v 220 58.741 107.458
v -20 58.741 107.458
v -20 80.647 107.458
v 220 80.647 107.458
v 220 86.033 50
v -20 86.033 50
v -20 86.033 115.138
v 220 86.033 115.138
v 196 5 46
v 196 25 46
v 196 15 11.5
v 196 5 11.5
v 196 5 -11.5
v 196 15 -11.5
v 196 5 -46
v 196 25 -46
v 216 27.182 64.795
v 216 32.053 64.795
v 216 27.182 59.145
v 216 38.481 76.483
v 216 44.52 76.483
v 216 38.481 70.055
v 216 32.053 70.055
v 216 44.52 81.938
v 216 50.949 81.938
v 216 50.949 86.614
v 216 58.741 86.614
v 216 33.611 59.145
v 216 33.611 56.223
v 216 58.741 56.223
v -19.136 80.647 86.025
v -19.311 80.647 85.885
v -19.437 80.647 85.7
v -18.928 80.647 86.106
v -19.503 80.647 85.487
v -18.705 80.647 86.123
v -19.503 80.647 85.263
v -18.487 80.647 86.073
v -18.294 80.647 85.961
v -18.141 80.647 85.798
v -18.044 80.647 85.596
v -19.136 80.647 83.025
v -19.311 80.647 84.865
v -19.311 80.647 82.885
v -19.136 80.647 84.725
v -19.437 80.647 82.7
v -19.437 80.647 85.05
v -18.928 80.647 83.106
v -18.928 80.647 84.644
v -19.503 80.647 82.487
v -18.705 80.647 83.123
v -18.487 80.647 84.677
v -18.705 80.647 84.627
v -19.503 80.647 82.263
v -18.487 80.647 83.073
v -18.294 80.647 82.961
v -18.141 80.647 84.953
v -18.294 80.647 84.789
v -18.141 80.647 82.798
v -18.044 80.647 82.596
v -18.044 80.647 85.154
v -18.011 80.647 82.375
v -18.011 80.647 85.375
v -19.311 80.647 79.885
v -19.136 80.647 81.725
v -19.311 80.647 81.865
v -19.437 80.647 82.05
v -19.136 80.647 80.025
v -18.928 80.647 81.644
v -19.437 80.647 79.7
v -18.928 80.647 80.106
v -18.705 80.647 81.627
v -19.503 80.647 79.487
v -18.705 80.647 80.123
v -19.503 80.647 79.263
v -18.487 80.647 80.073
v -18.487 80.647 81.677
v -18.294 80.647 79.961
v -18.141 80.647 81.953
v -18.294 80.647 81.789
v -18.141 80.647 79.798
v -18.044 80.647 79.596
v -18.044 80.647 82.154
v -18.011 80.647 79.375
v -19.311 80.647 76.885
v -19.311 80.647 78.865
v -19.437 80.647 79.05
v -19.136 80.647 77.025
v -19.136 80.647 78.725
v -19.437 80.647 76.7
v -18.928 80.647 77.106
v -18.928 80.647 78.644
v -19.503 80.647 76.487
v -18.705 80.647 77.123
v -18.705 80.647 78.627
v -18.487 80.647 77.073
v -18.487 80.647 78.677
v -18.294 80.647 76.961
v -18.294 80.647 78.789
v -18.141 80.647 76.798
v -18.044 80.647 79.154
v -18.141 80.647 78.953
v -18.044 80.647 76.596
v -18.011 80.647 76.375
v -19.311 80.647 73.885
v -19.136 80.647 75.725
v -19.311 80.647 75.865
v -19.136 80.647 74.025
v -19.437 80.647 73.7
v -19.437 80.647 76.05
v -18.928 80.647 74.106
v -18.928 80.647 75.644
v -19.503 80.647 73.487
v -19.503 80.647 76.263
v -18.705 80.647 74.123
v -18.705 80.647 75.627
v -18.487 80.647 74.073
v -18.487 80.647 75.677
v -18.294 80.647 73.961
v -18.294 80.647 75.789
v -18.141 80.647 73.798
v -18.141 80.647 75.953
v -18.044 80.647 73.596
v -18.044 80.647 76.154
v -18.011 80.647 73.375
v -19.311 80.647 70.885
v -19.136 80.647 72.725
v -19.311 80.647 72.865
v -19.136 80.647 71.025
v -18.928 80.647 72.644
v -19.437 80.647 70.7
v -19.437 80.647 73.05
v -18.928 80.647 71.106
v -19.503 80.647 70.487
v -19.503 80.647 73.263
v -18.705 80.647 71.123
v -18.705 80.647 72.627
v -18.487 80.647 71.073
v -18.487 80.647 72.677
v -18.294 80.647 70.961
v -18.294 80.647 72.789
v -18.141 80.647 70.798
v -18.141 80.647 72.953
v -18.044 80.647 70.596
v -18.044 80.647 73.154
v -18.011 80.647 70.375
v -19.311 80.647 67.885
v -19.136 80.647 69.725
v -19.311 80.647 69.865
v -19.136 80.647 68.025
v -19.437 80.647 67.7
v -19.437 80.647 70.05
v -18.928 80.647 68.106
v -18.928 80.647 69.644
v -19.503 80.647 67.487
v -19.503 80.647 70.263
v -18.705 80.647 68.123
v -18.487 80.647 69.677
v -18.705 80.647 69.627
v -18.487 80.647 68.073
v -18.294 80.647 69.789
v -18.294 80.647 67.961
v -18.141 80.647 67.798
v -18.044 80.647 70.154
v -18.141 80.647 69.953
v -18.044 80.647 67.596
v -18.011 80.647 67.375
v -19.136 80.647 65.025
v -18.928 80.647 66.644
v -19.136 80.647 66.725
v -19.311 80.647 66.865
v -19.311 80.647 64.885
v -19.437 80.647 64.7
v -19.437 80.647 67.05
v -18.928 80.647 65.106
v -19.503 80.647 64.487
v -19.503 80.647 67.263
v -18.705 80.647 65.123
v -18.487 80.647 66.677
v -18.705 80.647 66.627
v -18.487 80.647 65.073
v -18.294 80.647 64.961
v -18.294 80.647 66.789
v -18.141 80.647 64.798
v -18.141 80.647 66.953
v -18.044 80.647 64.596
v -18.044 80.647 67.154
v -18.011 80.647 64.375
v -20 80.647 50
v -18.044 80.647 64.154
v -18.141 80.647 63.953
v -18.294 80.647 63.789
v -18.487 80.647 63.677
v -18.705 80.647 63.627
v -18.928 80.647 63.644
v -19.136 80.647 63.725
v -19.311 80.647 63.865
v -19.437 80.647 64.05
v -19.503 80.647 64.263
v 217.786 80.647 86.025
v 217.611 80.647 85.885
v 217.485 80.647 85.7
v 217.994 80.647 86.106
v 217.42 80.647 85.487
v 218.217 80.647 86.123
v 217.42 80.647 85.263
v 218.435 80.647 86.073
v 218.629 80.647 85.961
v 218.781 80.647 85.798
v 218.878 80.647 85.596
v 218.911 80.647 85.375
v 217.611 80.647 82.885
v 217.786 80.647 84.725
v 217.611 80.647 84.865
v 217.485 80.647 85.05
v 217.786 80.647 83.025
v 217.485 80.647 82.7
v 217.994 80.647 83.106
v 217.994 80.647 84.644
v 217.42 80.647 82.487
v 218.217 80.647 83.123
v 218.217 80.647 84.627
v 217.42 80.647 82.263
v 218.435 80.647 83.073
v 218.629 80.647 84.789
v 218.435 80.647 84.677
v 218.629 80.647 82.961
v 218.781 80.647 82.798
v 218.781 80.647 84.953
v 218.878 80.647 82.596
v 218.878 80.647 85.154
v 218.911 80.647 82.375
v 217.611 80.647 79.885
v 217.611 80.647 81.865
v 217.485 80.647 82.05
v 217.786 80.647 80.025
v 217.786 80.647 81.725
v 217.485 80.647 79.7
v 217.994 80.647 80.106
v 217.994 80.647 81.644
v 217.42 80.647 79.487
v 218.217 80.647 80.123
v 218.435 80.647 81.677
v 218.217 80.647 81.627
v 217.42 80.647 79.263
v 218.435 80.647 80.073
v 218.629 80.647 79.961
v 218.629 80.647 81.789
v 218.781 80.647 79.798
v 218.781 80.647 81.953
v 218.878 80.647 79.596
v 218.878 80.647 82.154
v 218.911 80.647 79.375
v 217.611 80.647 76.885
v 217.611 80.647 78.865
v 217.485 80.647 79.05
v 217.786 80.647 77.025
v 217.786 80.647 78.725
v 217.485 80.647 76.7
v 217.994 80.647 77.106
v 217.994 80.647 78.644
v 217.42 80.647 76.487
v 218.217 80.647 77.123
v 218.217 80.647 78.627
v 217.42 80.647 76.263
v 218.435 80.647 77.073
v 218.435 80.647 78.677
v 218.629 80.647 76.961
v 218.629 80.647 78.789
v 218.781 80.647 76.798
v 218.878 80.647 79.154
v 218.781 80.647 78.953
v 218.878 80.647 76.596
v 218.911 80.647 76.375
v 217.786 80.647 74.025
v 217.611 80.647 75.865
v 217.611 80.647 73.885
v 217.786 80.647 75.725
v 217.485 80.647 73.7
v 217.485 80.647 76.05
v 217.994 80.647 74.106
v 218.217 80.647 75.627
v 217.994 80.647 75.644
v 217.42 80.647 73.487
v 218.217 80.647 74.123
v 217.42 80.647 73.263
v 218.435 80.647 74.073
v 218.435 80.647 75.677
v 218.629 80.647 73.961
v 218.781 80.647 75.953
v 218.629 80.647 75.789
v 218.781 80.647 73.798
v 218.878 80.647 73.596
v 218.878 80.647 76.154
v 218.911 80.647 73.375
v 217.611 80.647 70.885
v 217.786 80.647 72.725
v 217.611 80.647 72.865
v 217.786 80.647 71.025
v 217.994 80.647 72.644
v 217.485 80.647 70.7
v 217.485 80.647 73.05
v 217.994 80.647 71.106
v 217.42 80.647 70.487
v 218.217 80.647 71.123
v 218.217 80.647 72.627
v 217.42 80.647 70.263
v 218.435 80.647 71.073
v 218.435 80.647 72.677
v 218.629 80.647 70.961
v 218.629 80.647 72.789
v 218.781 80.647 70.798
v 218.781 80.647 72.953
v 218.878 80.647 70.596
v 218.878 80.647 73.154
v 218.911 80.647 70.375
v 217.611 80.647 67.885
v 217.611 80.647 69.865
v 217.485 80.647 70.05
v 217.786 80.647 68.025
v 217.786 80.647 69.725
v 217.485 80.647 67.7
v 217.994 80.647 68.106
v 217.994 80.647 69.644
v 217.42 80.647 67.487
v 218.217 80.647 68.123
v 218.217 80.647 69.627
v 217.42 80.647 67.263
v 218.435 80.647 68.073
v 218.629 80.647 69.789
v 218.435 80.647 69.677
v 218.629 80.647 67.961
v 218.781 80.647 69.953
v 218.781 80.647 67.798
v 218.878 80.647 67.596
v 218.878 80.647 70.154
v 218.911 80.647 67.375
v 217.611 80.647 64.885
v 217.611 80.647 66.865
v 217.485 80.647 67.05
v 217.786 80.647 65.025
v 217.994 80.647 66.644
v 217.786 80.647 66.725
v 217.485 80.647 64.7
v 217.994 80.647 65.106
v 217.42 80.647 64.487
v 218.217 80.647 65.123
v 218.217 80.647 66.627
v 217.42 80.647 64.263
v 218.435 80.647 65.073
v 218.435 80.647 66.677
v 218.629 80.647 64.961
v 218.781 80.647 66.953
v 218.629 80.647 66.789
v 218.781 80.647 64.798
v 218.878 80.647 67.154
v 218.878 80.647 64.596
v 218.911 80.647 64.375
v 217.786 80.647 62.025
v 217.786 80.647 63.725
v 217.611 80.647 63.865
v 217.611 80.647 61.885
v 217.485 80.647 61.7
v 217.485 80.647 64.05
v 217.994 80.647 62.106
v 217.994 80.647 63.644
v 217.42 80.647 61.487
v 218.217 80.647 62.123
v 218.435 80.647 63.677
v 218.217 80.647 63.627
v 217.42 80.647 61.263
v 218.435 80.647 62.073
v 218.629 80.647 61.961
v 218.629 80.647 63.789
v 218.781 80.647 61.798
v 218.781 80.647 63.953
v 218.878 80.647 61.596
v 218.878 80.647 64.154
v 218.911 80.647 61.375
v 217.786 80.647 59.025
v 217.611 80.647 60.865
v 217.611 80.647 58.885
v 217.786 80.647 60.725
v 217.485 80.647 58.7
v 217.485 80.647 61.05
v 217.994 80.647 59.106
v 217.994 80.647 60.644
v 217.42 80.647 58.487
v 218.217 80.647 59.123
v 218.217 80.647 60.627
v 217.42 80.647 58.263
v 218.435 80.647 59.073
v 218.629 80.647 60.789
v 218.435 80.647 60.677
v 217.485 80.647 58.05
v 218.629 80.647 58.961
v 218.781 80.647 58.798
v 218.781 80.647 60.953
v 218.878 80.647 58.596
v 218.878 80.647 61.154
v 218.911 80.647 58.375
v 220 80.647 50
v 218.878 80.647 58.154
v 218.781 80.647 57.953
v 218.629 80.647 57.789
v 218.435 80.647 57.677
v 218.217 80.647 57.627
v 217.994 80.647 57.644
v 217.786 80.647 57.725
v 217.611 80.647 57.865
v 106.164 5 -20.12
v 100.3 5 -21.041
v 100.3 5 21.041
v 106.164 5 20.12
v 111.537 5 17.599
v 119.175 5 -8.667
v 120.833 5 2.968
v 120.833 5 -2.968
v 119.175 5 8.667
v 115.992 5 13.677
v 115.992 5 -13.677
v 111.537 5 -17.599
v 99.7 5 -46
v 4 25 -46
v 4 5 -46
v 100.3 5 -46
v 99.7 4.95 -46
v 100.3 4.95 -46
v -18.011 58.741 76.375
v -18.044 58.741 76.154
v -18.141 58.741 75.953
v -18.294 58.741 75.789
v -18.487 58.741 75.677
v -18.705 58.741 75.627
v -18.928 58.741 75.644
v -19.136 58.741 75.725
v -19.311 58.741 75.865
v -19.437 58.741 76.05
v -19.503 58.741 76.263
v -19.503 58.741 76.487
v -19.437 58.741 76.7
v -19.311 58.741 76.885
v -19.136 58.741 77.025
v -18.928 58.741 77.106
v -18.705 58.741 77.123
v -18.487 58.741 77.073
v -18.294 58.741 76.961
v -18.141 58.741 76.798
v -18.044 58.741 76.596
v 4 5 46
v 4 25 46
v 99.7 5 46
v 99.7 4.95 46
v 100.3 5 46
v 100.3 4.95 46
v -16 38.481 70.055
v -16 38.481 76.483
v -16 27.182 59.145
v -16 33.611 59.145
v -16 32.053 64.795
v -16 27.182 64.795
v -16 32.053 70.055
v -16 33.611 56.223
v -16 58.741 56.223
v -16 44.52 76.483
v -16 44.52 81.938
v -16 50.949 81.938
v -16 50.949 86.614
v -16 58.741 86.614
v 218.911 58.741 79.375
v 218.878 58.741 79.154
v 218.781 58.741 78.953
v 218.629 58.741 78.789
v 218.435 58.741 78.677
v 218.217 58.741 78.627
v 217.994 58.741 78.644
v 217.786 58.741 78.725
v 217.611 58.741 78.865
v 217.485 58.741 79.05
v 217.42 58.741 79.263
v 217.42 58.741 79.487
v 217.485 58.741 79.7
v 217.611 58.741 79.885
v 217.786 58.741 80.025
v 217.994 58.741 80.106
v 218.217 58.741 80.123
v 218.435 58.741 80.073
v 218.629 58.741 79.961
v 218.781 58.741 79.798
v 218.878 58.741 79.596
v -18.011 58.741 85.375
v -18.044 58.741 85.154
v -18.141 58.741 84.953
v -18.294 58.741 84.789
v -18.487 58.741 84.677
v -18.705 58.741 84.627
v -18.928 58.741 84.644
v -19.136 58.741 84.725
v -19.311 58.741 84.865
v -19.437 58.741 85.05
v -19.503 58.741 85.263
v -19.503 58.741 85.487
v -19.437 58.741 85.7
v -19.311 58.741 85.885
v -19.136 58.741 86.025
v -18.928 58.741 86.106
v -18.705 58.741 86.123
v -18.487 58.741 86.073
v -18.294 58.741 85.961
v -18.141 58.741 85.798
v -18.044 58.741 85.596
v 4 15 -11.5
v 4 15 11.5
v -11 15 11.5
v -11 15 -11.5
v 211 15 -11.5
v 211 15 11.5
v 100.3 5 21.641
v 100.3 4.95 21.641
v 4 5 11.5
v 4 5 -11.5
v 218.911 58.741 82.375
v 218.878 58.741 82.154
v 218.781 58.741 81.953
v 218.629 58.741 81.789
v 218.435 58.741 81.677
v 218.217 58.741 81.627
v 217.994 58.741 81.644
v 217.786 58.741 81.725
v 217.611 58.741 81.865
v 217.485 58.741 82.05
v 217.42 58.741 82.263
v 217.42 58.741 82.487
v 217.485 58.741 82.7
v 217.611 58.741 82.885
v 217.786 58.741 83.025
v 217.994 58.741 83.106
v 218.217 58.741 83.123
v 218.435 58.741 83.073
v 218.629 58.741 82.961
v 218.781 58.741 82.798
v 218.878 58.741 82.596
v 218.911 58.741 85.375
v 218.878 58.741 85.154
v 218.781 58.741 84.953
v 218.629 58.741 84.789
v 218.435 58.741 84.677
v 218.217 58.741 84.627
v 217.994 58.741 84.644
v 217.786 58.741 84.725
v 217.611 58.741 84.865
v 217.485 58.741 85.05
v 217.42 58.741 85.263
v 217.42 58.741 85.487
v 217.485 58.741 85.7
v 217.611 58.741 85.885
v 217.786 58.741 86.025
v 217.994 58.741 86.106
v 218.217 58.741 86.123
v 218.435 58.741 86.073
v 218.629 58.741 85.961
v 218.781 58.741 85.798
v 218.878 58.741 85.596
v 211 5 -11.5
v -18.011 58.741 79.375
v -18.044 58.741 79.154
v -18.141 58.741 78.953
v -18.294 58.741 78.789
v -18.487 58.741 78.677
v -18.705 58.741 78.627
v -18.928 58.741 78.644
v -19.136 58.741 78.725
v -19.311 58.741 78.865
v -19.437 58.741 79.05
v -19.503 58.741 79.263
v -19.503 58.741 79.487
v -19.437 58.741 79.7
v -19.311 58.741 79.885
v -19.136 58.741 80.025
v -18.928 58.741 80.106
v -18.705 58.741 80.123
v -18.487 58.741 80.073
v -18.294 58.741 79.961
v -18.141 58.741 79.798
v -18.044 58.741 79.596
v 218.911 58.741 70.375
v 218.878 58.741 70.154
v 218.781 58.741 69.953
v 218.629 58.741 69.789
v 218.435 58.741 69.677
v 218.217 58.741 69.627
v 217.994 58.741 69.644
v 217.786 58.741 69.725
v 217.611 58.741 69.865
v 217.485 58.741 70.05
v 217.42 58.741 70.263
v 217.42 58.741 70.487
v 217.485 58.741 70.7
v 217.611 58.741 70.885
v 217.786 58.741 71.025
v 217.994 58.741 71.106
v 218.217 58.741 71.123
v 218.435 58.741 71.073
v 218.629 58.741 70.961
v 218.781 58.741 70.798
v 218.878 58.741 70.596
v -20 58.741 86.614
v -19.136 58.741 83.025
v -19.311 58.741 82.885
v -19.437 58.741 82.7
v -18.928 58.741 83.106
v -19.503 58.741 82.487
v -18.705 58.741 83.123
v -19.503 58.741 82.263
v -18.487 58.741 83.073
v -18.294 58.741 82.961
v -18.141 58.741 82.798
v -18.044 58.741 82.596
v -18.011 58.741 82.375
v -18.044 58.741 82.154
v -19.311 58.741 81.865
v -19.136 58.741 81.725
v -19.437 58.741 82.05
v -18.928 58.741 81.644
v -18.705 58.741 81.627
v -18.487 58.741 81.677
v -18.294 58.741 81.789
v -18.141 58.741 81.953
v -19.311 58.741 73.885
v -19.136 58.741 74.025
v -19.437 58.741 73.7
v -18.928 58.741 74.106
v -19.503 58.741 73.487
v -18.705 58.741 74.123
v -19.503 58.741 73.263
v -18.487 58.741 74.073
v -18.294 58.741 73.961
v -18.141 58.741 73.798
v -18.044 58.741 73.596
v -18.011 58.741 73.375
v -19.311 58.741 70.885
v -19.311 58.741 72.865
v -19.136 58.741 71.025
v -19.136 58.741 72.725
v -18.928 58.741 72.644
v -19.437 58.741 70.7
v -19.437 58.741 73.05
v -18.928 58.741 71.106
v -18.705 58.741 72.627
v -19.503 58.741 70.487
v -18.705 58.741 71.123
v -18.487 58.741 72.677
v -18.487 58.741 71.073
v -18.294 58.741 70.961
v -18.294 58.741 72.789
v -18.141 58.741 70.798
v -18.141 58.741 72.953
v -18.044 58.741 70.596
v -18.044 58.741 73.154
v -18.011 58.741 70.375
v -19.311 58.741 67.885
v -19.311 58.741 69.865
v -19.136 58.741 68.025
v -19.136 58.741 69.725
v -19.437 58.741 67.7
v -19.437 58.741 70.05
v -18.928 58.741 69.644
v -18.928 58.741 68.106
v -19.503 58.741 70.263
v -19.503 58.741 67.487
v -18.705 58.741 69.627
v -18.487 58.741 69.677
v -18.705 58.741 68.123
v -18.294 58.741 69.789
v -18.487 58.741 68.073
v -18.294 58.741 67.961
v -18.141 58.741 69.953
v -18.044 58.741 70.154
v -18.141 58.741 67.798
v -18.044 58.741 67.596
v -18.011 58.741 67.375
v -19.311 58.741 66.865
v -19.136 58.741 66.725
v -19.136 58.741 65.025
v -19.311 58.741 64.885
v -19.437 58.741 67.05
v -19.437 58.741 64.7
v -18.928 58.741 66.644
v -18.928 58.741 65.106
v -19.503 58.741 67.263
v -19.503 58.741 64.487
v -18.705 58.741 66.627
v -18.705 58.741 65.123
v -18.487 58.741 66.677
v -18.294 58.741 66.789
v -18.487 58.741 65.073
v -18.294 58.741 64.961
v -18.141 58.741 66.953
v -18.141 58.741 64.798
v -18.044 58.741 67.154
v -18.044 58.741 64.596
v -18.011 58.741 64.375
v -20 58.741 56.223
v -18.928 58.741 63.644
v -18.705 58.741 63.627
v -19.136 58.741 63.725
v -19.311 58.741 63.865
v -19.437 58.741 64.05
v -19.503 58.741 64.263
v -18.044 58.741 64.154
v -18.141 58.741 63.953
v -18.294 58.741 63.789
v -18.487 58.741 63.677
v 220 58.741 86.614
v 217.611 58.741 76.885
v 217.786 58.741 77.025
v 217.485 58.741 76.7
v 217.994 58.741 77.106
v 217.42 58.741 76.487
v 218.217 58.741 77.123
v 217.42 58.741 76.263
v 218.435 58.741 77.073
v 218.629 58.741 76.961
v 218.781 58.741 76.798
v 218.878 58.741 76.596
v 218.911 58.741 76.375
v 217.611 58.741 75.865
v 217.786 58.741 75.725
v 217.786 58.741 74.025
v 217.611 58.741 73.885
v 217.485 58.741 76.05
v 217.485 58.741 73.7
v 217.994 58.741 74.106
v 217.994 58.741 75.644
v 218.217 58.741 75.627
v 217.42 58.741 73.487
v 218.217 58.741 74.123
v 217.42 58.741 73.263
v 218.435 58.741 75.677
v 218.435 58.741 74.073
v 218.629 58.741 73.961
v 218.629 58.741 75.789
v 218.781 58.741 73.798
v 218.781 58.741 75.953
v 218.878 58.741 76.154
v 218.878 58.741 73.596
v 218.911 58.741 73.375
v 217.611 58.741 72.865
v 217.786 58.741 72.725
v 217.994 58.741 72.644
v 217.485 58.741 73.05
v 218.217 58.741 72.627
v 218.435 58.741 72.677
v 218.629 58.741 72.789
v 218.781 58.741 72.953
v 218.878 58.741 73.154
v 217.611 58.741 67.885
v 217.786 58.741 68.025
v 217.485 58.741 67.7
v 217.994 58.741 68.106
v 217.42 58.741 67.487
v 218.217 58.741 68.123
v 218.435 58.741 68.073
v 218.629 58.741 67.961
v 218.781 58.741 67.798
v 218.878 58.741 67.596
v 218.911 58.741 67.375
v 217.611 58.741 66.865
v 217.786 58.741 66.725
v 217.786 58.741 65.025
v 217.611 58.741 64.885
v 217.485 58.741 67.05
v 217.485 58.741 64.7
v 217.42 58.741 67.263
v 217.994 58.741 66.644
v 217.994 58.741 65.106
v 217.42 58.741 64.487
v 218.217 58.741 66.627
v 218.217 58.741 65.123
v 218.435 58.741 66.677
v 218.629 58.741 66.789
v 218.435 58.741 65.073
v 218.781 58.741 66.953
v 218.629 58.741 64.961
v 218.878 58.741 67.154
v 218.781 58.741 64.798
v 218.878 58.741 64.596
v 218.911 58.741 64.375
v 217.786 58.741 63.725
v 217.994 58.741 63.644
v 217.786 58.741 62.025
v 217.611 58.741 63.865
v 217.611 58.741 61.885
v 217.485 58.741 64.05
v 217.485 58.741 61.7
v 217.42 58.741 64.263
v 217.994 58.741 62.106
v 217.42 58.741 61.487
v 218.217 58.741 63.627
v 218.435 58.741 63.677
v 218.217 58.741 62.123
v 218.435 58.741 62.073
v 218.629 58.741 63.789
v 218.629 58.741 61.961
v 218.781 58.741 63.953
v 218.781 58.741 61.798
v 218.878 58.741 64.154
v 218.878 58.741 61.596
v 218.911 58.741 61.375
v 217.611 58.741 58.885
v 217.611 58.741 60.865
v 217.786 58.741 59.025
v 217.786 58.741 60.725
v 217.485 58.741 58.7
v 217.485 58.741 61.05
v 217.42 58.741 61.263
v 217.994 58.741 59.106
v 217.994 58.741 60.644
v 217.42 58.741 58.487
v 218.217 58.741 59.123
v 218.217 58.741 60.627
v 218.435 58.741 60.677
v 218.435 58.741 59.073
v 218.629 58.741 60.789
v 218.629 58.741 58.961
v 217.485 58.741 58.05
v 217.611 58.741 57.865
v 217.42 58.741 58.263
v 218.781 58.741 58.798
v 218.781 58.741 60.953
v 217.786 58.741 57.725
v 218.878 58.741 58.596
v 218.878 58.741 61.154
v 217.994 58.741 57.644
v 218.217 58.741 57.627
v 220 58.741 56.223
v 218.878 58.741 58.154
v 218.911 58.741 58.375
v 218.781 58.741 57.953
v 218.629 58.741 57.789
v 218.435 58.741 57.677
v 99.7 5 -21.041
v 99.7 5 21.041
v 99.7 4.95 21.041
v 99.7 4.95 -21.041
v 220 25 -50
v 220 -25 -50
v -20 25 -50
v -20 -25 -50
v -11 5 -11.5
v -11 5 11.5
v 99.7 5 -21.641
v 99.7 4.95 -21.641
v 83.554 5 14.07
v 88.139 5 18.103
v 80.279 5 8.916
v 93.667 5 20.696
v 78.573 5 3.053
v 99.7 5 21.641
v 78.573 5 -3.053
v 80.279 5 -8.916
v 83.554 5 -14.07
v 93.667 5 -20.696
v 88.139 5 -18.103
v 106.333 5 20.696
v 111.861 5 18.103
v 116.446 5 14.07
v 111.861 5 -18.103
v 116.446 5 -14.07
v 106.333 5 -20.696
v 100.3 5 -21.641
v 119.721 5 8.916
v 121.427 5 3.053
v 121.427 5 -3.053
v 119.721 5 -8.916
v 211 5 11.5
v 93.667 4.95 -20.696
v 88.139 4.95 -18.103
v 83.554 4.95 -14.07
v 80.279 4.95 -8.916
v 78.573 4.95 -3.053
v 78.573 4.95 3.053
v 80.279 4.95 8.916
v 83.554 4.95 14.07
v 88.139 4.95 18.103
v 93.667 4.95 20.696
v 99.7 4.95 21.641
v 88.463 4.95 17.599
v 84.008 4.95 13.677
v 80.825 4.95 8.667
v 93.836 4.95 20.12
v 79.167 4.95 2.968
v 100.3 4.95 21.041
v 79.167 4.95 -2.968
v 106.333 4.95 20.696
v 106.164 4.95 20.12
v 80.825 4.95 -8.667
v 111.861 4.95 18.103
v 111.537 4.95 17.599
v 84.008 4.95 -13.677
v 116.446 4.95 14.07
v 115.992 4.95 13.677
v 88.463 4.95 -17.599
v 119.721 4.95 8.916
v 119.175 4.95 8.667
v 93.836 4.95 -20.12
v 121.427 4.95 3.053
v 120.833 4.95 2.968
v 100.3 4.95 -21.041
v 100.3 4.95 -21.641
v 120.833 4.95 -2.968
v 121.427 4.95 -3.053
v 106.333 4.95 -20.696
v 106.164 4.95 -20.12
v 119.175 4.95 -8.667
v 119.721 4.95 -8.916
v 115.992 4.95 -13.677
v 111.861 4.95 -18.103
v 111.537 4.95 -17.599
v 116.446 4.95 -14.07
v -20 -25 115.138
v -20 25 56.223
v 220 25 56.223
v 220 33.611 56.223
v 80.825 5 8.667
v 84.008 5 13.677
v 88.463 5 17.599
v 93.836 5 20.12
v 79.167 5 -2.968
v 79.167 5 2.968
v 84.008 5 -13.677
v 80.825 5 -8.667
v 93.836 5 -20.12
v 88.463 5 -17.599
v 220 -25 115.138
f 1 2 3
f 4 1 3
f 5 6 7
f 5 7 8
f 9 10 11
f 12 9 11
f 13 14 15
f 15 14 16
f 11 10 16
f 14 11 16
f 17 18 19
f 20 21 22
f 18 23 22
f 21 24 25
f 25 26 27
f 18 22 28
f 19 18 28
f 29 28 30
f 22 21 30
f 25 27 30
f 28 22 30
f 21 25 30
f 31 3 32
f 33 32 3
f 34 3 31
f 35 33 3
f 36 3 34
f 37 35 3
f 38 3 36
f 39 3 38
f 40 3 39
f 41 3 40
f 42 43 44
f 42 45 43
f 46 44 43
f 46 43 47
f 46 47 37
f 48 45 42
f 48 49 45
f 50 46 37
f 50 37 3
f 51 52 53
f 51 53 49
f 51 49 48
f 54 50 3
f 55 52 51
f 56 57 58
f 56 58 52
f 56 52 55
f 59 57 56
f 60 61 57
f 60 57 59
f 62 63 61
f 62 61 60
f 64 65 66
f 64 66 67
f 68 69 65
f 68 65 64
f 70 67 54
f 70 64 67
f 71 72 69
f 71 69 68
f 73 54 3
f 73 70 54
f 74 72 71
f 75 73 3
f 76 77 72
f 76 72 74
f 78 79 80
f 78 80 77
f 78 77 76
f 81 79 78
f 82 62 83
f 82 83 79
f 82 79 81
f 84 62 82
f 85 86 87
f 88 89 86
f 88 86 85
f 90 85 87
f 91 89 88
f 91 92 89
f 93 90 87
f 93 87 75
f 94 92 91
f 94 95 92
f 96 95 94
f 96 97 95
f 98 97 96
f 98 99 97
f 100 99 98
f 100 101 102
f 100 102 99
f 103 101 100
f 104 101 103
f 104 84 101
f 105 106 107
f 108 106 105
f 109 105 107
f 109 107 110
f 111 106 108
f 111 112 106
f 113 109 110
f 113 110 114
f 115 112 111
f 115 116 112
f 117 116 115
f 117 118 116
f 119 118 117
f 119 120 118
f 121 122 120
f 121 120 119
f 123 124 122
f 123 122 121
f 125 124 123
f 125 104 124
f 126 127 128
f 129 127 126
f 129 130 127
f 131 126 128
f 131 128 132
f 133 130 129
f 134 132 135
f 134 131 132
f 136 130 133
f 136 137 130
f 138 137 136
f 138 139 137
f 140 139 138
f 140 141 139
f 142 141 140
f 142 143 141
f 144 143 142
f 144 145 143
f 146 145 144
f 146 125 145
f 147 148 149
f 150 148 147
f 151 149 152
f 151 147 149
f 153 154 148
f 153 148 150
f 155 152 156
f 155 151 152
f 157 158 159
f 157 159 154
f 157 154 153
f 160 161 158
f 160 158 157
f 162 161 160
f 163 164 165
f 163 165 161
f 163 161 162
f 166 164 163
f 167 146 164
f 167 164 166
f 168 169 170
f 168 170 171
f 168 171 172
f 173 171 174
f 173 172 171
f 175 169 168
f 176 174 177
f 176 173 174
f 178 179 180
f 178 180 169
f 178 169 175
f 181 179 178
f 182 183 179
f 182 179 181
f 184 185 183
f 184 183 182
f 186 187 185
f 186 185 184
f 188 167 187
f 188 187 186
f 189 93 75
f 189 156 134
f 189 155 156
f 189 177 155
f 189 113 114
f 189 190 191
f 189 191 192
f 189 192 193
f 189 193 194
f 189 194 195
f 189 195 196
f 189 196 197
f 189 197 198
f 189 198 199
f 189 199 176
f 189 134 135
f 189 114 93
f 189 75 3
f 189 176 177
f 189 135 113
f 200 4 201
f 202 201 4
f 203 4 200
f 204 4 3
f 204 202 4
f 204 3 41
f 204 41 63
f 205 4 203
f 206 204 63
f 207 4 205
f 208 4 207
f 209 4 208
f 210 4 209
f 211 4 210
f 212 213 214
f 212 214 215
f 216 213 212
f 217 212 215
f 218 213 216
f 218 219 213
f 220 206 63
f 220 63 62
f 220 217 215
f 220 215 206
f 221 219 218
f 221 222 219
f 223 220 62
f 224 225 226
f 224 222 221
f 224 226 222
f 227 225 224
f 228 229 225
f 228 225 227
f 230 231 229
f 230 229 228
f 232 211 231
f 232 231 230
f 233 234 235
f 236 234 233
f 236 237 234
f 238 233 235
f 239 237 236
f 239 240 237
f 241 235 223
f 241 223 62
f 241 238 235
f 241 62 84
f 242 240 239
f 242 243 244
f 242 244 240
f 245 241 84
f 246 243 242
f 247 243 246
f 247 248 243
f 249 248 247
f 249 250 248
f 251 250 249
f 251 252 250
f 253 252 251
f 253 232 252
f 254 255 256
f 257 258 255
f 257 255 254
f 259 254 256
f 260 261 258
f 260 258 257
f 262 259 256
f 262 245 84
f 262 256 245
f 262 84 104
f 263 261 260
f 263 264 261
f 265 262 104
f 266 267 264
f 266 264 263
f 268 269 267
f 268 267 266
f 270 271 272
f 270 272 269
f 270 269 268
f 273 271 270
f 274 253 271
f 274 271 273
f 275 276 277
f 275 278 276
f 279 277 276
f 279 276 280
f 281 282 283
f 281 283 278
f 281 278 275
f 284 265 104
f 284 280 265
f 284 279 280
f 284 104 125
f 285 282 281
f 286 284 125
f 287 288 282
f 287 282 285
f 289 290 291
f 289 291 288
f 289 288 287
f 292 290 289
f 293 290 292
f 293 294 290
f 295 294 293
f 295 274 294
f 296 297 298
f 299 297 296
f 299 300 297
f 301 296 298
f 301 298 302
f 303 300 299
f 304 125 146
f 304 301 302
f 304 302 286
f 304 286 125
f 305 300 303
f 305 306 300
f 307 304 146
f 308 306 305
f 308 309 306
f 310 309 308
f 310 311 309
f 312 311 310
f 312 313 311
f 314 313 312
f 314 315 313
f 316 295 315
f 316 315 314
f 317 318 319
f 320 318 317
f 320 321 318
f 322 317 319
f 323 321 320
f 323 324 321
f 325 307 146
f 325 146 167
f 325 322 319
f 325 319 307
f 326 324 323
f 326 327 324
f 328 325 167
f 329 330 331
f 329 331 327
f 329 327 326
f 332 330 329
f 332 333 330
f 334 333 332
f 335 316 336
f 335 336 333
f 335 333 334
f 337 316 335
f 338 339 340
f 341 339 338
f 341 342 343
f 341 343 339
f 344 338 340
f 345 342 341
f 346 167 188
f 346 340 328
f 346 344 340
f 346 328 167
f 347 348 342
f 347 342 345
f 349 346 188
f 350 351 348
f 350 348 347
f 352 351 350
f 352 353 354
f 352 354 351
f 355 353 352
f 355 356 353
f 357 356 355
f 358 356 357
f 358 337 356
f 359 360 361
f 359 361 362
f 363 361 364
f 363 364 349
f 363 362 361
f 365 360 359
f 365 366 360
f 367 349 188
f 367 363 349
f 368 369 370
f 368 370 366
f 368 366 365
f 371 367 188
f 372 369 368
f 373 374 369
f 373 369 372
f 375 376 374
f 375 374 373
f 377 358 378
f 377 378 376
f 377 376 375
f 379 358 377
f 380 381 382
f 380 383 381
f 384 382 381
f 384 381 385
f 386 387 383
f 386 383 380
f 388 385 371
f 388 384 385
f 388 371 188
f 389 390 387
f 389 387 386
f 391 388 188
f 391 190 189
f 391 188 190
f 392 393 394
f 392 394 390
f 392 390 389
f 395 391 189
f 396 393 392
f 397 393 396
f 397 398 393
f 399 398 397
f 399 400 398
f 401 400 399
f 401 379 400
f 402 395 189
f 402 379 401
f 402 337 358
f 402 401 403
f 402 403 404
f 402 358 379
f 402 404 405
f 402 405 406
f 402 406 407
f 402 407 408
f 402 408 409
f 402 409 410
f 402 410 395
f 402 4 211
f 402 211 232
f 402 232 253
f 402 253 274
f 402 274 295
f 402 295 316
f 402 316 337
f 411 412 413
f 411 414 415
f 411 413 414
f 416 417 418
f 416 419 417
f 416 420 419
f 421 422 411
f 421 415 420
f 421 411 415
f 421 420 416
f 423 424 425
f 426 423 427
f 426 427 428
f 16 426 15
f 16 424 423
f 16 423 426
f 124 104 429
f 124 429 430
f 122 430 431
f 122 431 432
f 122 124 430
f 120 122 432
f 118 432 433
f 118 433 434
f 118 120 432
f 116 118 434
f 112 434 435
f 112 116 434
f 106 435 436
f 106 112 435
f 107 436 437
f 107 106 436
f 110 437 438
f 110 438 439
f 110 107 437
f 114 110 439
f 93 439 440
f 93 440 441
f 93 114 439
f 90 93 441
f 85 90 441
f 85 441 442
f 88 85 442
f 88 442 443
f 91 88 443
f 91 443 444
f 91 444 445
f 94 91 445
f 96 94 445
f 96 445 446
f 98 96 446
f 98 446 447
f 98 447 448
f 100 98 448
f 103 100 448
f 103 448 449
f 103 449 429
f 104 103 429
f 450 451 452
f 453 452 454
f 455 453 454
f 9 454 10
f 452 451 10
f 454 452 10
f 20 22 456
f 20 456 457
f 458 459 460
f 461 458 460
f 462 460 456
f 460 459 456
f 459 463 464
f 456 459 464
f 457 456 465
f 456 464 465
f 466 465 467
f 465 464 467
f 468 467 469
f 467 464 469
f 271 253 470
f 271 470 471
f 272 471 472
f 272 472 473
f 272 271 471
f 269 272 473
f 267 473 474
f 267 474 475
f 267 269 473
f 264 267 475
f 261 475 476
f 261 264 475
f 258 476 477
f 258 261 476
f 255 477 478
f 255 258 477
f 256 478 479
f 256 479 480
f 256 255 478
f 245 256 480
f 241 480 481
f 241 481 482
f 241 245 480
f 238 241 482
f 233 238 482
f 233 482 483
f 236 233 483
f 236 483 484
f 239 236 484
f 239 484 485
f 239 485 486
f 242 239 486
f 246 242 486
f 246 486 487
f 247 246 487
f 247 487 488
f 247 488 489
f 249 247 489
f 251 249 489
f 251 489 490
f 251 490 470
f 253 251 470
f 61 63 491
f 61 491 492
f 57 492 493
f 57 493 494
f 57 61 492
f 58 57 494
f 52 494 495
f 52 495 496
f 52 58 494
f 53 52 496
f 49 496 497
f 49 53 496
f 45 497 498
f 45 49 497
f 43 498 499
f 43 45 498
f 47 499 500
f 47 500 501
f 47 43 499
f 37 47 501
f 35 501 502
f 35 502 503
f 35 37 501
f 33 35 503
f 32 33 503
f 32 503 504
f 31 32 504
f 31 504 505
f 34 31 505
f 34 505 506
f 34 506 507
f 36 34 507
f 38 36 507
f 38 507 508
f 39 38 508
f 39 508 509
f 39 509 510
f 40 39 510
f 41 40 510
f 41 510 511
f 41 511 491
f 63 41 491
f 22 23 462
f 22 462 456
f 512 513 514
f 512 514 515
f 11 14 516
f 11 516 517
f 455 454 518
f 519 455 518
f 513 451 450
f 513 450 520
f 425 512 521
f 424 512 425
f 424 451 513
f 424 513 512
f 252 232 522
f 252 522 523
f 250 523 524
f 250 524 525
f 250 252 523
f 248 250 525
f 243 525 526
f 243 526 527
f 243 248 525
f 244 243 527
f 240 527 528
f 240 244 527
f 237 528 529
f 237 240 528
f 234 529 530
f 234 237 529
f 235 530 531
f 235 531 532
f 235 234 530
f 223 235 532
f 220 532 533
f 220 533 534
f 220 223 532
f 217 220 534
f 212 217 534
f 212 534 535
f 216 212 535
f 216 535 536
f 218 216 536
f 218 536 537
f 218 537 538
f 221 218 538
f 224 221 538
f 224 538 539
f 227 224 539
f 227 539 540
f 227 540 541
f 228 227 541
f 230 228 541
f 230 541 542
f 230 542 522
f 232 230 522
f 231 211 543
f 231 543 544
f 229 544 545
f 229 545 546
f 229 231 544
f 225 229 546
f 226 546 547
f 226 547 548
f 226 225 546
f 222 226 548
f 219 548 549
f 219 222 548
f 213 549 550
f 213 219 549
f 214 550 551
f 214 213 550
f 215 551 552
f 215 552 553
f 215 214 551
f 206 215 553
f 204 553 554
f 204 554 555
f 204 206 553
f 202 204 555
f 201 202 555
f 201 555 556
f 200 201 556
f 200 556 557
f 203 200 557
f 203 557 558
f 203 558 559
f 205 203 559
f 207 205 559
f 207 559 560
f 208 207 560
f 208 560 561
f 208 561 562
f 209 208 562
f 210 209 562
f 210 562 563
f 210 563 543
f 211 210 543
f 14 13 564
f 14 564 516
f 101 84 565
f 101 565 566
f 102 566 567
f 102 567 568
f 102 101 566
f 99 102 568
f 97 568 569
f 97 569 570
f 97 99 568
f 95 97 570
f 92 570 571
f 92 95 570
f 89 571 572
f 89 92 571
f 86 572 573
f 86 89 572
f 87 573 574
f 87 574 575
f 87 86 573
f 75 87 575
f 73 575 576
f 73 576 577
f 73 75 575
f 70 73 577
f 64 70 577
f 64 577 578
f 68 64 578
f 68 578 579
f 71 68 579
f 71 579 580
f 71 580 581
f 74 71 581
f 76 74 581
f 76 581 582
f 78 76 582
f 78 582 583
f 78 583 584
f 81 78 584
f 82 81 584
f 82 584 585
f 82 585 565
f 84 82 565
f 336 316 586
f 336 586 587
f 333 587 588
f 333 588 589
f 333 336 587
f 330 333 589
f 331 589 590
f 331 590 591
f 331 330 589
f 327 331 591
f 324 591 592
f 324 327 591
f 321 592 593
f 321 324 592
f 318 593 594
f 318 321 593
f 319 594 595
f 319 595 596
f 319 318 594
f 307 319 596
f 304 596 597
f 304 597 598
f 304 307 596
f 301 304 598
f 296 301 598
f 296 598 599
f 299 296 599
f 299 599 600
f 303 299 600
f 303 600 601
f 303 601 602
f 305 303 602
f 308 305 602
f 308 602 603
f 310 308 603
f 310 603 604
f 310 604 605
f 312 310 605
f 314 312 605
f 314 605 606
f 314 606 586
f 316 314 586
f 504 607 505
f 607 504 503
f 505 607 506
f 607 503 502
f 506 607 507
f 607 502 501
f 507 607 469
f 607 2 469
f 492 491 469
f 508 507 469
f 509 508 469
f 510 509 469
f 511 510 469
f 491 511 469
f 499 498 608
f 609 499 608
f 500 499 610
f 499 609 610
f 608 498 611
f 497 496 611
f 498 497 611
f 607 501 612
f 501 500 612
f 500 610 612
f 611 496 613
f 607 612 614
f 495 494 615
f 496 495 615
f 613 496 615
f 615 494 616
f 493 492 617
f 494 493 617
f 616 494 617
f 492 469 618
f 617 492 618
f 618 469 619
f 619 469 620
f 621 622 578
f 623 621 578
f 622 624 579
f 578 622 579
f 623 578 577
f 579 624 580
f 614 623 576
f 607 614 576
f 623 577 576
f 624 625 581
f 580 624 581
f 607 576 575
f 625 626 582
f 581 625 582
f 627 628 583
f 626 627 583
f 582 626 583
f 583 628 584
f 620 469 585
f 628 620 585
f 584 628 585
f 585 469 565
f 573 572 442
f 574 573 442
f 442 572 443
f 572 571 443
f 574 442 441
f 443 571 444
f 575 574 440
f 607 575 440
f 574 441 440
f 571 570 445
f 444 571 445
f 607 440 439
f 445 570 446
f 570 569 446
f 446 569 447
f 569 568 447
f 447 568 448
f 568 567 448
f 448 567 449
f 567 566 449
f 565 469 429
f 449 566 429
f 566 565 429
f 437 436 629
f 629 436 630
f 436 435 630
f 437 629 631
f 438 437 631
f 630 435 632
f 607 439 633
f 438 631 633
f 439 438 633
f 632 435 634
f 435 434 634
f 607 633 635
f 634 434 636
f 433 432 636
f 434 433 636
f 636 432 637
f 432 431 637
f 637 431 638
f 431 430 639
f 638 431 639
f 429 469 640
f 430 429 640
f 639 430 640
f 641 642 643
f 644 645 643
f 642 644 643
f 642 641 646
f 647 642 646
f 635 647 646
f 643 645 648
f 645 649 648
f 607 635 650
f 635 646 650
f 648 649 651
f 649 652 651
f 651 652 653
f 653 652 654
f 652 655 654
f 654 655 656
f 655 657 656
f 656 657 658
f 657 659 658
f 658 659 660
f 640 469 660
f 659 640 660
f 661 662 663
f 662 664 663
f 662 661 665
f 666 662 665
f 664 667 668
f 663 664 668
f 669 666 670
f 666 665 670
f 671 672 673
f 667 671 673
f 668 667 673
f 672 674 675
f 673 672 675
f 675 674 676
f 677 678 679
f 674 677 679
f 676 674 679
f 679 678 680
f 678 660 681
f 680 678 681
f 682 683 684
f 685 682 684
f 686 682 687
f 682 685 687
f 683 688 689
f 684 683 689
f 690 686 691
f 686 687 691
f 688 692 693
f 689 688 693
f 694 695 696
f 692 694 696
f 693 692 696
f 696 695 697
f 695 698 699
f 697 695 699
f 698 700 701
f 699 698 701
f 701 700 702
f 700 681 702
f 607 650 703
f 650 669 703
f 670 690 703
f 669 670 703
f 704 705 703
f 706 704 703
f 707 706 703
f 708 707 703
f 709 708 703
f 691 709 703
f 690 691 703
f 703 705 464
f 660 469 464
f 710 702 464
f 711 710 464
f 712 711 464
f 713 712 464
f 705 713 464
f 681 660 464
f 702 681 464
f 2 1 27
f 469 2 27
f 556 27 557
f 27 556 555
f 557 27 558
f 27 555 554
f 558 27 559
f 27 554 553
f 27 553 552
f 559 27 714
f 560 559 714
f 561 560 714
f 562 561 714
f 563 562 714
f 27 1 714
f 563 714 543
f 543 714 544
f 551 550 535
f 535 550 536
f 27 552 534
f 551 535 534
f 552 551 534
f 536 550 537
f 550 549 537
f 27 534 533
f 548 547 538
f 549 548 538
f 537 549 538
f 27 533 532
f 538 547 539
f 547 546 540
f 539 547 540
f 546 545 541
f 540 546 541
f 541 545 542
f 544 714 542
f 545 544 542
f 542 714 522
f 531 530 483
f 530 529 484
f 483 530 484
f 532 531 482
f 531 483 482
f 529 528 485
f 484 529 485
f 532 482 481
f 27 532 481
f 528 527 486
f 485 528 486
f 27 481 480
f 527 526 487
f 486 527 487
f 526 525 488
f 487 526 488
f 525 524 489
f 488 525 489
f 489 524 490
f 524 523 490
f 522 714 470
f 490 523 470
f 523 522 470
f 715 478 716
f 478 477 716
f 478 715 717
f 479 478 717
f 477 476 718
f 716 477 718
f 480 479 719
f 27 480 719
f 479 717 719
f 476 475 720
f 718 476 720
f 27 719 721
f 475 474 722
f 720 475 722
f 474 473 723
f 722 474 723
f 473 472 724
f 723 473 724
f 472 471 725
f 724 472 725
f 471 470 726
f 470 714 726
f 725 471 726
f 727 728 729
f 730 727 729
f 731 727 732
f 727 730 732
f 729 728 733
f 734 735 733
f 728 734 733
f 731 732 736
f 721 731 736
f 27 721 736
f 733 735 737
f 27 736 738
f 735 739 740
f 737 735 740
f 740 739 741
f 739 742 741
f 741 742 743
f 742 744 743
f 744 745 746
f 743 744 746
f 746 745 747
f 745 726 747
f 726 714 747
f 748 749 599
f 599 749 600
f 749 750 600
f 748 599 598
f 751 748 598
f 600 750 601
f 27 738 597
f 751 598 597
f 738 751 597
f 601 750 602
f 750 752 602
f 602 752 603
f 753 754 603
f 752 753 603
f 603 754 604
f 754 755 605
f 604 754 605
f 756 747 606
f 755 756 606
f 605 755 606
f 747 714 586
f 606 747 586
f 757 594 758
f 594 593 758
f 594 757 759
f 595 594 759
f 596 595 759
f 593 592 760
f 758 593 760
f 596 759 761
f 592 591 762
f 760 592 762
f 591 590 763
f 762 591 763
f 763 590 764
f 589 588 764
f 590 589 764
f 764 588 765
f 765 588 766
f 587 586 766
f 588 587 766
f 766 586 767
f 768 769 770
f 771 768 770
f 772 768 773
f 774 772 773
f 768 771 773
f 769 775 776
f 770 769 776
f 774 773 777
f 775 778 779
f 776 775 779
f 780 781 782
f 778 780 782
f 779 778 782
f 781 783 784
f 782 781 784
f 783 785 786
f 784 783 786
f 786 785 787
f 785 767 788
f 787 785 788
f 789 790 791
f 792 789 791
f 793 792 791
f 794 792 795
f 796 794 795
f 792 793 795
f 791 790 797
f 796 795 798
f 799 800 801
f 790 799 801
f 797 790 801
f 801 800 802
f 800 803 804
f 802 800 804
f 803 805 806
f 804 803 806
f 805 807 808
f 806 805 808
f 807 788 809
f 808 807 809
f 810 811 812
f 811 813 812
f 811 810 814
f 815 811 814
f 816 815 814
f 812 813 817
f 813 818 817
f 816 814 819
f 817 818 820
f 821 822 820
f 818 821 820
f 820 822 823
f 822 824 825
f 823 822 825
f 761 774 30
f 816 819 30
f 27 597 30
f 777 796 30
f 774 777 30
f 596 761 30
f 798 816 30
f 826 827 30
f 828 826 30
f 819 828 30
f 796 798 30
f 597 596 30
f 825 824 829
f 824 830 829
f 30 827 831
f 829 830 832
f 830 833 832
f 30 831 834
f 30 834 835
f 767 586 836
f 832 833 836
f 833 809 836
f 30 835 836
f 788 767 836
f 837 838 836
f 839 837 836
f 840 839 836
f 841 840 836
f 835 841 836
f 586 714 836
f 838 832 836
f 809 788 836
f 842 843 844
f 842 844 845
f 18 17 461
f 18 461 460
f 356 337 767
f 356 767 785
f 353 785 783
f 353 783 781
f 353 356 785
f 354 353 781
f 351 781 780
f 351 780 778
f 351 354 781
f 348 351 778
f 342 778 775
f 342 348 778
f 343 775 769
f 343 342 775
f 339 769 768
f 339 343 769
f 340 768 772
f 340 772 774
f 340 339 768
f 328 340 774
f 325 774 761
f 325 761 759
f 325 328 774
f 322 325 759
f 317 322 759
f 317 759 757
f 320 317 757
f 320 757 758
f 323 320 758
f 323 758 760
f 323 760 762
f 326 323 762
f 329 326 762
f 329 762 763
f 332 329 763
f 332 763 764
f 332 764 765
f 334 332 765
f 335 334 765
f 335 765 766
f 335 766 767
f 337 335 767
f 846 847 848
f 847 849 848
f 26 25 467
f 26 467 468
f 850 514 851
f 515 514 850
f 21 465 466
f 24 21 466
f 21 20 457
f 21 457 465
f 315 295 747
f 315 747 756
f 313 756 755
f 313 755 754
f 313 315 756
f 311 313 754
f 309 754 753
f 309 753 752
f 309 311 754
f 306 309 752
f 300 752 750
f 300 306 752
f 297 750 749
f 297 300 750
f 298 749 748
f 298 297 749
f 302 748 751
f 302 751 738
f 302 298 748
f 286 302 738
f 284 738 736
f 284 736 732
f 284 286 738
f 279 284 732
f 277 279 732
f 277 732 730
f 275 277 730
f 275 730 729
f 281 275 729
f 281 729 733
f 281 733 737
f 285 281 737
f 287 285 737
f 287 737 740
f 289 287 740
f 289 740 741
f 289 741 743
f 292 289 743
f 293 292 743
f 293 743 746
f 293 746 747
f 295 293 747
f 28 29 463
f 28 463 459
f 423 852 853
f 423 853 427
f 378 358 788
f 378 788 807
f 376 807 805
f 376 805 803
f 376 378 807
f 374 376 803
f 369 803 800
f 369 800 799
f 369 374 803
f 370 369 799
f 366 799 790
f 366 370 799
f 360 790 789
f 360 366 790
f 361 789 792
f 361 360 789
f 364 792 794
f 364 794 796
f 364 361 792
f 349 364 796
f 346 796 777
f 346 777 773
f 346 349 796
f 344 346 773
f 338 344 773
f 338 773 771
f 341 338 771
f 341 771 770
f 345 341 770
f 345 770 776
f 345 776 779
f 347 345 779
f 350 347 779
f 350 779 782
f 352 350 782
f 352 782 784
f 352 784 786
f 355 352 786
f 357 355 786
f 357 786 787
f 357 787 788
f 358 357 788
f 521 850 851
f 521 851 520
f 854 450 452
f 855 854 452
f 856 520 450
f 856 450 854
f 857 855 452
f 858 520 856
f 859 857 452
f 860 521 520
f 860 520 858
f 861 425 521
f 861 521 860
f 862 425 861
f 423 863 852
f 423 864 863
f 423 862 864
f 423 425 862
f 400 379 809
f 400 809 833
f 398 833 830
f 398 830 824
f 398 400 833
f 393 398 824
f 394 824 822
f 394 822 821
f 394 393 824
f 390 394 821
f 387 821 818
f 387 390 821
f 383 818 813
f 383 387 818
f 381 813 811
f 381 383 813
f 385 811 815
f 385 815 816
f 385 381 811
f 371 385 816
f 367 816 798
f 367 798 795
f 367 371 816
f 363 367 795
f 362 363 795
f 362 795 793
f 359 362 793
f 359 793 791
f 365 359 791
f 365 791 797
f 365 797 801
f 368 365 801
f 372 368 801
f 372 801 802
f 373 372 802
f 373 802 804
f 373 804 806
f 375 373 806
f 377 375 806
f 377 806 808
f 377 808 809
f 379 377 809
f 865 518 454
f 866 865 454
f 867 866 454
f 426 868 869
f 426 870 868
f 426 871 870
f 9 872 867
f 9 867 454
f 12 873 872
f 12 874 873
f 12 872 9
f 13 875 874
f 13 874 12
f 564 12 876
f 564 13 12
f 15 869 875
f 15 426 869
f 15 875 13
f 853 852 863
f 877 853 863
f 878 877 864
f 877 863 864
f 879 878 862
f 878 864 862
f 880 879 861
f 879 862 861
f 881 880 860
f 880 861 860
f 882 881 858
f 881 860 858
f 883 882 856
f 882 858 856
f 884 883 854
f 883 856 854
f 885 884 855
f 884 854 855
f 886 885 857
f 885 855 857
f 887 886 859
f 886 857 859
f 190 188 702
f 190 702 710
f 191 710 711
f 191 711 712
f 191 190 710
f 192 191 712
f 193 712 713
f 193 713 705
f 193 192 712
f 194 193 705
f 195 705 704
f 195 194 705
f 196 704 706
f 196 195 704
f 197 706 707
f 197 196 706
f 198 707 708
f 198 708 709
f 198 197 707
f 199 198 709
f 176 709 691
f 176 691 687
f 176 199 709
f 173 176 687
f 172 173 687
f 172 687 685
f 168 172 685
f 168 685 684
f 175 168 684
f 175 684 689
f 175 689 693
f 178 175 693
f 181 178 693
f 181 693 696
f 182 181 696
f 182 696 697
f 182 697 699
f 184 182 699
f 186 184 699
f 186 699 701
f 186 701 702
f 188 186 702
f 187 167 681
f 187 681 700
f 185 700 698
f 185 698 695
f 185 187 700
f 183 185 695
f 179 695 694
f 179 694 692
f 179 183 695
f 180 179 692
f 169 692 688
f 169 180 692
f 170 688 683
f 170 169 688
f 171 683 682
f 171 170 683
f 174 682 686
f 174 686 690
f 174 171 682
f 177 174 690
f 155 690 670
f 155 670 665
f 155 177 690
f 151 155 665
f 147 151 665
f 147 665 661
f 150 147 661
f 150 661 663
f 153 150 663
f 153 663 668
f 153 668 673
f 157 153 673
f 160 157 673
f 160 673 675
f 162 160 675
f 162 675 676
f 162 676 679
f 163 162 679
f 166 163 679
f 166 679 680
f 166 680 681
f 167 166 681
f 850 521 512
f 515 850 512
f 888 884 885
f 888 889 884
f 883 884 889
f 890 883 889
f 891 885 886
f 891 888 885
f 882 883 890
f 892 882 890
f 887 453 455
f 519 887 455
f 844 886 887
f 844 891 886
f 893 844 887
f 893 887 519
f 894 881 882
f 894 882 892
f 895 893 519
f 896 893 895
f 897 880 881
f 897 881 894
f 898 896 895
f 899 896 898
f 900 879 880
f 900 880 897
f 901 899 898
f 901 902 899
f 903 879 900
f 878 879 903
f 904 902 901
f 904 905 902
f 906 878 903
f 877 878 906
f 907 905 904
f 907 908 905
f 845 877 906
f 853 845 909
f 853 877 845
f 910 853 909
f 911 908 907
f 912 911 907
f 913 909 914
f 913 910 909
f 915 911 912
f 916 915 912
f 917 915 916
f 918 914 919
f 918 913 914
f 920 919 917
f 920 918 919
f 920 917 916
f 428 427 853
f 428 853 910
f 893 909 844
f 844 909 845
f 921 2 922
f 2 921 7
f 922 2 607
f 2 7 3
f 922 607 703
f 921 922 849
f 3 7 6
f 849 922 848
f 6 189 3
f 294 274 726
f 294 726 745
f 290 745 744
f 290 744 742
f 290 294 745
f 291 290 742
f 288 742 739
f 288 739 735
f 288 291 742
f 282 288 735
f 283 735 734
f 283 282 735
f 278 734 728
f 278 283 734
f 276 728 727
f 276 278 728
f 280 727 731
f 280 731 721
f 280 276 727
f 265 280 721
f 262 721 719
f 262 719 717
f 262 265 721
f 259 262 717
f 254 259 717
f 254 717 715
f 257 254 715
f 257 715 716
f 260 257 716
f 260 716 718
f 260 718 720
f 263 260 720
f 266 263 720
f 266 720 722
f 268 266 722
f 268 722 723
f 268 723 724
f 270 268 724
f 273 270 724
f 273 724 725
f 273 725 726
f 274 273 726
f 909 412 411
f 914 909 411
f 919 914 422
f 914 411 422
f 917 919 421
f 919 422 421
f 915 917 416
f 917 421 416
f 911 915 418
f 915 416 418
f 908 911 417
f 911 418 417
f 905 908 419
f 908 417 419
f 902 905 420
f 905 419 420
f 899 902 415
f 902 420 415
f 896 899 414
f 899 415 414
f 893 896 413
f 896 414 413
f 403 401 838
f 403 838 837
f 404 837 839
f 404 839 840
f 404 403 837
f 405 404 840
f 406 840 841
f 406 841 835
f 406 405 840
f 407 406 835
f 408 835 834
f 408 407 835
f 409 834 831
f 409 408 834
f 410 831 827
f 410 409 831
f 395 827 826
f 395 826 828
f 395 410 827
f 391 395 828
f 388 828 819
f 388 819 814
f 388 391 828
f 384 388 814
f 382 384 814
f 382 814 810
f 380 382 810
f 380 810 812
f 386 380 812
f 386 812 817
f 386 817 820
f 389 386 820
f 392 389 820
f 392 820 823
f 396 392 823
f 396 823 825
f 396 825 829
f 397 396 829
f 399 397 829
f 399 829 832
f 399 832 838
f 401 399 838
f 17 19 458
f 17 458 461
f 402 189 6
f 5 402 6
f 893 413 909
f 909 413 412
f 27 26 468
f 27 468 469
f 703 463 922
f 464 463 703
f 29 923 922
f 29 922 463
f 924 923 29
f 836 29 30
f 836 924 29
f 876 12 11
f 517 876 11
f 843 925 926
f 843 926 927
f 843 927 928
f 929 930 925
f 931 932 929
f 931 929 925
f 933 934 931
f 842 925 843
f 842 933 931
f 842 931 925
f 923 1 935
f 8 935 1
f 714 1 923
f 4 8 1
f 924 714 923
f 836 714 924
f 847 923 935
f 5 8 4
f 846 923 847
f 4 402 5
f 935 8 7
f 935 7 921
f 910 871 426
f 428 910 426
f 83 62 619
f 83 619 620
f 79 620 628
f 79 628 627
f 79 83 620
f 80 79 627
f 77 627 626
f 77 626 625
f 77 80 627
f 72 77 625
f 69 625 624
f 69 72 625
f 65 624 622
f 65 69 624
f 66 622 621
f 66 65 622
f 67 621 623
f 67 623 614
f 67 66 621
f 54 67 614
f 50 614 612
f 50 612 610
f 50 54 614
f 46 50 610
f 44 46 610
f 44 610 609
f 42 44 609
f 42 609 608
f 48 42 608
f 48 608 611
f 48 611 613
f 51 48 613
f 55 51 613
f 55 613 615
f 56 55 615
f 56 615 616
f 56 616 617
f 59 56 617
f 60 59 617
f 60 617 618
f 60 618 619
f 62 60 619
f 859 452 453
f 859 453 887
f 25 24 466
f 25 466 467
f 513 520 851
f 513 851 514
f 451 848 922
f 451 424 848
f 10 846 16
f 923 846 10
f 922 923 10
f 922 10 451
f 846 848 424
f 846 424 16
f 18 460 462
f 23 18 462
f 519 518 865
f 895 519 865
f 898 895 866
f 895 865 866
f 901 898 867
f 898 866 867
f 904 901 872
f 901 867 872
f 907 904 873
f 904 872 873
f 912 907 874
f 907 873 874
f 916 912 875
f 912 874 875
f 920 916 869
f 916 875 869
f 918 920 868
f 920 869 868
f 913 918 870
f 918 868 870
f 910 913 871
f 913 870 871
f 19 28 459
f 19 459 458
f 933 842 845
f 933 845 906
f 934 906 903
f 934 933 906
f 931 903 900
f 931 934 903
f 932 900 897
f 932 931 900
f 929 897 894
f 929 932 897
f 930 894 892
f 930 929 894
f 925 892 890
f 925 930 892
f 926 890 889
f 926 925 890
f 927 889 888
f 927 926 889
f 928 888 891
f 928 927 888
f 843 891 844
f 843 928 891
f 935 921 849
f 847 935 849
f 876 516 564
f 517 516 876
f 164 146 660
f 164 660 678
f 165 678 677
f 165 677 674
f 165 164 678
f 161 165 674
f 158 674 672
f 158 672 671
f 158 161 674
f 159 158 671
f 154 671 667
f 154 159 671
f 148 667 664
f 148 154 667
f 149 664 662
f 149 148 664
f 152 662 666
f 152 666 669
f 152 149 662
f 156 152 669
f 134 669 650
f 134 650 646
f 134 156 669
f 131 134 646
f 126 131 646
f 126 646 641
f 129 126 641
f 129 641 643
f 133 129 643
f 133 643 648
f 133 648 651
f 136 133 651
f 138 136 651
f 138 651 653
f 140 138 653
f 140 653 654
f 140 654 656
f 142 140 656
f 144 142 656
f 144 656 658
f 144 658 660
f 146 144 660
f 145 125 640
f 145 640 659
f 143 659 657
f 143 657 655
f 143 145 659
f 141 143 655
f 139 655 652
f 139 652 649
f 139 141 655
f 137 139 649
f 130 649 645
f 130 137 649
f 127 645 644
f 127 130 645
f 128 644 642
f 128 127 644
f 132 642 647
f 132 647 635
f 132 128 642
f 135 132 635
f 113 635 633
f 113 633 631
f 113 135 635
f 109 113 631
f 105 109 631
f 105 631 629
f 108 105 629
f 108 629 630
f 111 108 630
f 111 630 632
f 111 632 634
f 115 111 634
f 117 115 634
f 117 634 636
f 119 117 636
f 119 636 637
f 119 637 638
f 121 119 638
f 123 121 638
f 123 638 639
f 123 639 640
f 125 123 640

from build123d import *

# Parameters (mm, degrees)
SKETCH_1_W            = 100
SKETCH_1_H            = 50
EXTRUDE_1_DEPTH       = 200
SKETCH_2_W            = 192
SKETCH_2_H            = 92
CUT_EXTRUDE_1_DEPTH   = 20
SKETCH_3_W            = 100
SKETCH_3_H            = 50
EXTRUDE_2_DEPTH       = 20
SKETCH_4_W            = 100
SKETCH_4_H            = 50
EXTRUDE_3_DEPTH       = 20
SKETCH_6_W            = 23
SKETCH_6_H            = 10
CUT_EXTRUDE_2_DEPTH   = 15
SKETCH_7_W            = 23
SKETCH_7_H            = 10
CUT_EXTRUDE_3_DEPTH   = 15
SKETCH_10_R           = 21.643075995
SKETCH_10_R_2         = 21.043075995
SKETCH_10_W           = 0.6
SKETCH_10_H           = 92
CUT_EXTRUDE_2_2_DEPTH = 0.05
EXTRUDE_4_DEPTH       = 240
SKETCH_12_W           = 30.390175899
SKETCH_12_H           = 33.741429703
EXTRUDE_5_DEPTH       = 4
SKETCH_13_W           = 30.390175899
SKETCH_13_H           = 33.741429703
EXTRUDE_6_DEPTH       = 4
SKETCH_14_R           = 0.75
EXTRUDE_7_DEPTH       = 27.291157


with BuildPart() as part:
    # 草圖1 → 填料-伸長1 (new body)
    with BuildSketch(Plane(origin=(0, 0, 0), x_dir=(0, 0, -1), z_dir=(1, 0, 0))):
        Rectangle(SKETCH_1_W, SKETCH_1_H)
    extrude(amount=EXTRUDE_1_DEPTH)

    # 草圖2 → 除料-伸長1 (cut)
    with BuildSketch(Plane(origin=(0, 25, 0), x_dir=(1, 0, 0), z_dir=(0, 1, 0))):
        with Locations((100, 0)):
            Rectangle(SKETCH_2_W, SKETCH_2_H)
    extrude(amount=-CUT_EXTRUDE_1_DEPTH, mode=Mode.SUBTRACT)

    # 草圖3 → 填料-伸長2 (add)
    with BuildSketch(Plane.ZY):
        Rectangle(SKETCH_3_W, SKETCH_3_H)
    extrude(amount=EXTRUDE_2_DEPTH)

    # 草圖4 → 填料-伸長3 (add)
    with BuildSketch(Plane(origin=(200, 0, 0), x_dir=(0, 0, -1), z_dir=(1, 0, 0))):
        Rectangle(SKETCH_4_W, SKETCH_4_H)
    extrude(amount=EXTRUDE_3_DEPTH)

    # 草圖6 → Cut-Extrude 2 (cut)
    with BuildSketch(Plane(origin=(4, 0, 0), x_dir=(0, 0, -1), z_dir=(1, 0, 0))):
        with Locations((0, 10)):
            Rectangle(SKETCH_6_W, SKETCH_6_H)
    extrude(amount=-CUT_EXTRUDE_2_DEPTH, mode=Mode.SUBTRACT)

    # 草圖7 → 除料-伸長3 (cut)
    with BuildSketch(Plane.ZY.offset(-196)):
        with Locations((0, 10)):
            Rectangle(SKETCH_7_W, SKETCH_7_H)
    extrude(amount=-CUT_EXTRUDE_3_DEPTH, mode=Mode.SUBTRACT)

    # 草圖10 → Cut-Extrude 2 2 (cut)
    with BuildSketch(Plane(origin=(0, 5, 0), x_dir=(1, 0, 0), z_dir=(0, 1, 0))):
        with Locations((100, 0)):
            Circle(SKETCH_10_R)
        with Locations((100, 0)):
            Circle(SKETCH_10_R_2, mode=Mode.SUBTRACT)
        with Locations((100, 0)):
            Rectangle(SKETCH_10_W, SKETCH_10_H)
    extrude(amount=-CUT_EXTRUDE_2_2_DEPTH, mode=Mode.SUBTRACT)

    # 草圖11 → 填料-伸長4 (add)
    with BuildSketch(Plane(origin=(220, 0, 0), x_dir=(0, 0, -1), z_dir=(1, 0, 0))):
        Polygon((-50, 25), (-56.223345598, 25), (-56.223345598, 33.611091941), (-59.145477896, 33.611091941), (-59.145477896, 27.182400885), (-64.794933673, 27.182400885), (-64.794933673, 32.052621382), (-70.054771809, 32.052621382), (-70.054771809, 38.481312437), (-76.483462864, 38.481312437), (-76.483462864, 44.520385853), (-81.938109821, 44.520385853), (-81.938109821, 50.949076909), (-86.613521497, 50.949076909), (-86.613521497, 58.741429703), (-107.458065223, 58.741429703), (-107.458065223, 80.646512644), (-50, 80.646512644), (-50, 86.032586896), (-115.138208137, 86.032586896), (-115.138208137, -25), (-50, -25), align=None)
    extrude(amount=-EXTRUDE_4_DEPTH)

    # 草圖12 → 填料-伸長5 (add)
    with BuildSketch(Plane(origin=(220, 0, 0), x_dir=(0, 0, -1), z_dir=(1, 0, 0))):
        with Locations((-71.418433548, 41.870714851)):
            Rectangle(SKETCH_12_W, SKETCH_12_H)
    extrude(amount=-EXTRUDE_5_DEPTH)

    # 草圖13 → 填料-伸長6 (add)
    with BuildSketch(Plane.ZY.offset(20)):
        with Locations((71.418433548, 41.870714851)):
            Rectangle(SKETCH_13_W, SKETCH_13_H)
    extrude(amount=-EXTRUDE_6_DEPTH)

    # 草圖14 → 填料-伸長7 (add)
    with BuildSketch(Plane(origin=(0, 86.032586896, 0), x_dir=(1, 0, 0), z_dir=(0, 1, 0))):
        with Locations((218.161156155, -76.375011751)):
            Circle(SKETCH_14_R)
        with Locations((218.161156155, -73.375011751)):
            Circle(SKETCH_14_R)
        with Locations((218.161156155, -70.375011751)):
            Circle(SKETCH_14_R)
        with Locations((218.161156155, -67.375011751)):
            Circle(SKETCH_14_R)
        with Locations((218.161156155, -64.375011751)):
            Circle(SKETCH_14_R)
        with Locations((218.161156155, -61.375011751)):
            Circle(SKETCH_14_R)
        with Locations((218.161156155, -58.375011751)):
            Circle(SKETCH_14_R)
        with Locations((-18.761156155, -85.375011751)):
            Circle(SKETCH_14_R)
        with Locations((-18.761156155, -79.375011751)):
            Circle(SKETCH_14_R)
        with Locations((-18.761156155, -70.375011751)):
            Circle(SKETCH_14_R)
        with Locations((218.161156155, -85.375011751)):
            Circle(SKETCH_14_R)
        with Locations((218.161156155, -82.375011751)):
            Circle(SKETCH_14_R)
        with Locations((218.161156155, -79.375011751)):
            Circle(SKETCH_14_R)
        with Locations((-18.761156155, -82.375011751)):
            Circle(SKETCH_14_R)
        with Locations((-18.761156155, -76.375011751)):
            Circle(SKETCH_14_R)
        with Locations((-18.761156155, -73.375011751)):
            Circle(SKETCH_14_R)
        with Locations((-18.761156155, -67.375011751)):
            Circle(SKETCH_14_R)
        with Locations((-18.761156155, -64.375011751)):
            Circle(SKETCH_14_R)
    extrude(amount=-EXTRUDE_7_DEPTH)


solid = part.part
